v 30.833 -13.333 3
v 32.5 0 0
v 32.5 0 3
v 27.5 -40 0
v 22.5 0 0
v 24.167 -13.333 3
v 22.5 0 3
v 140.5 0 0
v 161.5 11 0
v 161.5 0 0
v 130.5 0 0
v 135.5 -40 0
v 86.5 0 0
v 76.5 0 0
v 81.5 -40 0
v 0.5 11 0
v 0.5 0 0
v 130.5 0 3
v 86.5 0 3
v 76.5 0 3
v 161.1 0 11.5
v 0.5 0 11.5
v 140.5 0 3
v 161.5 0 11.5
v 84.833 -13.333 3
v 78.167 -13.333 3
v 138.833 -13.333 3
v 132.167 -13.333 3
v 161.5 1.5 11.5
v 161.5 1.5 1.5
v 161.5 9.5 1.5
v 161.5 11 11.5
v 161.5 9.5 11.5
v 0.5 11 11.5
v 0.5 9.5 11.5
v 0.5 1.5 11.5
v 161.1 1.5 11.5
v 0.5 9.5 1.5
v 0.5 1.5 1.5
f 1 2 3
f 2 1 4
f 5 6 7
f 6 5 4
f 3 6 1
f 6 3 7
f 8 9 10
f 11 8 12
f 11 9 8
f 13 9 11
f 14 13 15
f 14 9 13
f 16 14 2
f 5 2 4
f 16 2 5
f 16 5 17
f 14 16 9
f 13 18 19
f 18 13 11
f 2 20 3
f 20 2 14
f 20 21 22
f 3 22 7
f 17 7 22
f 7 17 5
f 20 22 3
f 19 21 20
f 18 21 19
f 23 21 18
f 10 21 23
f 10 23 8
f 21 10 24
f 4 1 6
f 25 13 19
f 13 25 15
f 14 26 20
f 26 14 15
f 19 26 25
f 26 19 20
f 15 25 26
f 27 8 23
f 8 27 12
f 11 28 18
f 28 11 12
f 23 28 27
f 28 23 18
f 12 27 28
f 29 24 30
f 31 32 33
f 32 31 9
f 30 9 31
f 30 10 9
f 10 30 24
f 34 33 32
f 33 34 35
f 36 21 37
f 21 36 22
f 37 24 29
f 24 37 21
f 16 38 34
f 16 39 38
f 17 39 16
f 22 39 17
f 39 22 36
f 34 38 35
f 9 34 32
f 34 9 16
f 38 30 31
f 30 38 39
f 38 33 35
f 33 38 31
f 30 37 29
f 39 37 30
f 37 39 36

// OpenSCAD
led_count=3;
strip_width=8;
strip_height=3;
between_cut_lines=54;

visor_width=1.5;
visor_height=10;
short_visor_height=10;
base_height=1.5;

pad=0.1;
padd=pad*2;

zip_width=4;
//solid piece above zip ties
zip_gap=3;
zip_step=1;

end_cap=-0.5;

garden_height=3;
garden_length=40;
garden_width=10;
garden_angle=atan(garden_width/2/garden_length);
garden_other_angle=atan(garden_height*1.5/garden_length);

length=between_cut_lines*led_count+end_cap*2;

module anti_cap() {
    translate([-end_cap-pad,-pad,-pad])
    cube([pad+end_cap*2,strip_width+padd+visor_width*2,visor_height+base_height+padd]);
}

difference() {
    translate([-end_cap,0,0]) 
    union() {
        cube([length,strip_width+visor_width*2,visor_height+base_height]);
        for (i=[0:zip_step:led_count-1]) {
            translate([between_cut_lines/2-garden_width/2+between_cut_lines*i,-garden_length,0]) {
                difference() {
                    cube([garden_width,garden_length,garden_height]);
                    rotate([garden_other_angle,0,0])
                    cube([garden_width,garden_length*1.5,garden_height]);
                    translate([0,0,-pad]) {
                        translate([garden_width/2,0,0])
                        rotate([0,0,-garden_angle])
                        cube([garden_width,garden_length*2,garden_height+padd]);
                        translate([garden_width/2,0,0])
                        rotate([0,0,garden_angle])
                        translate([-garden_width,0,0])
                        cube([garden_width,garden_length*2,garden_height+padd]);
                    }
                }
            }
        }
    }
    translate([-pad-end_cap,visor_width,base_height])
    union() {
        cube([length+padd,strip_width,visor_height+pad]);
        cube([length+padd,strip_width,strip_height]);

    }
    translate([-pad,-pad,base_height+short_visor_height])
    cube([length+padd,visor_width+padd,visor_height+pad]);

    //anti_cap();
}
